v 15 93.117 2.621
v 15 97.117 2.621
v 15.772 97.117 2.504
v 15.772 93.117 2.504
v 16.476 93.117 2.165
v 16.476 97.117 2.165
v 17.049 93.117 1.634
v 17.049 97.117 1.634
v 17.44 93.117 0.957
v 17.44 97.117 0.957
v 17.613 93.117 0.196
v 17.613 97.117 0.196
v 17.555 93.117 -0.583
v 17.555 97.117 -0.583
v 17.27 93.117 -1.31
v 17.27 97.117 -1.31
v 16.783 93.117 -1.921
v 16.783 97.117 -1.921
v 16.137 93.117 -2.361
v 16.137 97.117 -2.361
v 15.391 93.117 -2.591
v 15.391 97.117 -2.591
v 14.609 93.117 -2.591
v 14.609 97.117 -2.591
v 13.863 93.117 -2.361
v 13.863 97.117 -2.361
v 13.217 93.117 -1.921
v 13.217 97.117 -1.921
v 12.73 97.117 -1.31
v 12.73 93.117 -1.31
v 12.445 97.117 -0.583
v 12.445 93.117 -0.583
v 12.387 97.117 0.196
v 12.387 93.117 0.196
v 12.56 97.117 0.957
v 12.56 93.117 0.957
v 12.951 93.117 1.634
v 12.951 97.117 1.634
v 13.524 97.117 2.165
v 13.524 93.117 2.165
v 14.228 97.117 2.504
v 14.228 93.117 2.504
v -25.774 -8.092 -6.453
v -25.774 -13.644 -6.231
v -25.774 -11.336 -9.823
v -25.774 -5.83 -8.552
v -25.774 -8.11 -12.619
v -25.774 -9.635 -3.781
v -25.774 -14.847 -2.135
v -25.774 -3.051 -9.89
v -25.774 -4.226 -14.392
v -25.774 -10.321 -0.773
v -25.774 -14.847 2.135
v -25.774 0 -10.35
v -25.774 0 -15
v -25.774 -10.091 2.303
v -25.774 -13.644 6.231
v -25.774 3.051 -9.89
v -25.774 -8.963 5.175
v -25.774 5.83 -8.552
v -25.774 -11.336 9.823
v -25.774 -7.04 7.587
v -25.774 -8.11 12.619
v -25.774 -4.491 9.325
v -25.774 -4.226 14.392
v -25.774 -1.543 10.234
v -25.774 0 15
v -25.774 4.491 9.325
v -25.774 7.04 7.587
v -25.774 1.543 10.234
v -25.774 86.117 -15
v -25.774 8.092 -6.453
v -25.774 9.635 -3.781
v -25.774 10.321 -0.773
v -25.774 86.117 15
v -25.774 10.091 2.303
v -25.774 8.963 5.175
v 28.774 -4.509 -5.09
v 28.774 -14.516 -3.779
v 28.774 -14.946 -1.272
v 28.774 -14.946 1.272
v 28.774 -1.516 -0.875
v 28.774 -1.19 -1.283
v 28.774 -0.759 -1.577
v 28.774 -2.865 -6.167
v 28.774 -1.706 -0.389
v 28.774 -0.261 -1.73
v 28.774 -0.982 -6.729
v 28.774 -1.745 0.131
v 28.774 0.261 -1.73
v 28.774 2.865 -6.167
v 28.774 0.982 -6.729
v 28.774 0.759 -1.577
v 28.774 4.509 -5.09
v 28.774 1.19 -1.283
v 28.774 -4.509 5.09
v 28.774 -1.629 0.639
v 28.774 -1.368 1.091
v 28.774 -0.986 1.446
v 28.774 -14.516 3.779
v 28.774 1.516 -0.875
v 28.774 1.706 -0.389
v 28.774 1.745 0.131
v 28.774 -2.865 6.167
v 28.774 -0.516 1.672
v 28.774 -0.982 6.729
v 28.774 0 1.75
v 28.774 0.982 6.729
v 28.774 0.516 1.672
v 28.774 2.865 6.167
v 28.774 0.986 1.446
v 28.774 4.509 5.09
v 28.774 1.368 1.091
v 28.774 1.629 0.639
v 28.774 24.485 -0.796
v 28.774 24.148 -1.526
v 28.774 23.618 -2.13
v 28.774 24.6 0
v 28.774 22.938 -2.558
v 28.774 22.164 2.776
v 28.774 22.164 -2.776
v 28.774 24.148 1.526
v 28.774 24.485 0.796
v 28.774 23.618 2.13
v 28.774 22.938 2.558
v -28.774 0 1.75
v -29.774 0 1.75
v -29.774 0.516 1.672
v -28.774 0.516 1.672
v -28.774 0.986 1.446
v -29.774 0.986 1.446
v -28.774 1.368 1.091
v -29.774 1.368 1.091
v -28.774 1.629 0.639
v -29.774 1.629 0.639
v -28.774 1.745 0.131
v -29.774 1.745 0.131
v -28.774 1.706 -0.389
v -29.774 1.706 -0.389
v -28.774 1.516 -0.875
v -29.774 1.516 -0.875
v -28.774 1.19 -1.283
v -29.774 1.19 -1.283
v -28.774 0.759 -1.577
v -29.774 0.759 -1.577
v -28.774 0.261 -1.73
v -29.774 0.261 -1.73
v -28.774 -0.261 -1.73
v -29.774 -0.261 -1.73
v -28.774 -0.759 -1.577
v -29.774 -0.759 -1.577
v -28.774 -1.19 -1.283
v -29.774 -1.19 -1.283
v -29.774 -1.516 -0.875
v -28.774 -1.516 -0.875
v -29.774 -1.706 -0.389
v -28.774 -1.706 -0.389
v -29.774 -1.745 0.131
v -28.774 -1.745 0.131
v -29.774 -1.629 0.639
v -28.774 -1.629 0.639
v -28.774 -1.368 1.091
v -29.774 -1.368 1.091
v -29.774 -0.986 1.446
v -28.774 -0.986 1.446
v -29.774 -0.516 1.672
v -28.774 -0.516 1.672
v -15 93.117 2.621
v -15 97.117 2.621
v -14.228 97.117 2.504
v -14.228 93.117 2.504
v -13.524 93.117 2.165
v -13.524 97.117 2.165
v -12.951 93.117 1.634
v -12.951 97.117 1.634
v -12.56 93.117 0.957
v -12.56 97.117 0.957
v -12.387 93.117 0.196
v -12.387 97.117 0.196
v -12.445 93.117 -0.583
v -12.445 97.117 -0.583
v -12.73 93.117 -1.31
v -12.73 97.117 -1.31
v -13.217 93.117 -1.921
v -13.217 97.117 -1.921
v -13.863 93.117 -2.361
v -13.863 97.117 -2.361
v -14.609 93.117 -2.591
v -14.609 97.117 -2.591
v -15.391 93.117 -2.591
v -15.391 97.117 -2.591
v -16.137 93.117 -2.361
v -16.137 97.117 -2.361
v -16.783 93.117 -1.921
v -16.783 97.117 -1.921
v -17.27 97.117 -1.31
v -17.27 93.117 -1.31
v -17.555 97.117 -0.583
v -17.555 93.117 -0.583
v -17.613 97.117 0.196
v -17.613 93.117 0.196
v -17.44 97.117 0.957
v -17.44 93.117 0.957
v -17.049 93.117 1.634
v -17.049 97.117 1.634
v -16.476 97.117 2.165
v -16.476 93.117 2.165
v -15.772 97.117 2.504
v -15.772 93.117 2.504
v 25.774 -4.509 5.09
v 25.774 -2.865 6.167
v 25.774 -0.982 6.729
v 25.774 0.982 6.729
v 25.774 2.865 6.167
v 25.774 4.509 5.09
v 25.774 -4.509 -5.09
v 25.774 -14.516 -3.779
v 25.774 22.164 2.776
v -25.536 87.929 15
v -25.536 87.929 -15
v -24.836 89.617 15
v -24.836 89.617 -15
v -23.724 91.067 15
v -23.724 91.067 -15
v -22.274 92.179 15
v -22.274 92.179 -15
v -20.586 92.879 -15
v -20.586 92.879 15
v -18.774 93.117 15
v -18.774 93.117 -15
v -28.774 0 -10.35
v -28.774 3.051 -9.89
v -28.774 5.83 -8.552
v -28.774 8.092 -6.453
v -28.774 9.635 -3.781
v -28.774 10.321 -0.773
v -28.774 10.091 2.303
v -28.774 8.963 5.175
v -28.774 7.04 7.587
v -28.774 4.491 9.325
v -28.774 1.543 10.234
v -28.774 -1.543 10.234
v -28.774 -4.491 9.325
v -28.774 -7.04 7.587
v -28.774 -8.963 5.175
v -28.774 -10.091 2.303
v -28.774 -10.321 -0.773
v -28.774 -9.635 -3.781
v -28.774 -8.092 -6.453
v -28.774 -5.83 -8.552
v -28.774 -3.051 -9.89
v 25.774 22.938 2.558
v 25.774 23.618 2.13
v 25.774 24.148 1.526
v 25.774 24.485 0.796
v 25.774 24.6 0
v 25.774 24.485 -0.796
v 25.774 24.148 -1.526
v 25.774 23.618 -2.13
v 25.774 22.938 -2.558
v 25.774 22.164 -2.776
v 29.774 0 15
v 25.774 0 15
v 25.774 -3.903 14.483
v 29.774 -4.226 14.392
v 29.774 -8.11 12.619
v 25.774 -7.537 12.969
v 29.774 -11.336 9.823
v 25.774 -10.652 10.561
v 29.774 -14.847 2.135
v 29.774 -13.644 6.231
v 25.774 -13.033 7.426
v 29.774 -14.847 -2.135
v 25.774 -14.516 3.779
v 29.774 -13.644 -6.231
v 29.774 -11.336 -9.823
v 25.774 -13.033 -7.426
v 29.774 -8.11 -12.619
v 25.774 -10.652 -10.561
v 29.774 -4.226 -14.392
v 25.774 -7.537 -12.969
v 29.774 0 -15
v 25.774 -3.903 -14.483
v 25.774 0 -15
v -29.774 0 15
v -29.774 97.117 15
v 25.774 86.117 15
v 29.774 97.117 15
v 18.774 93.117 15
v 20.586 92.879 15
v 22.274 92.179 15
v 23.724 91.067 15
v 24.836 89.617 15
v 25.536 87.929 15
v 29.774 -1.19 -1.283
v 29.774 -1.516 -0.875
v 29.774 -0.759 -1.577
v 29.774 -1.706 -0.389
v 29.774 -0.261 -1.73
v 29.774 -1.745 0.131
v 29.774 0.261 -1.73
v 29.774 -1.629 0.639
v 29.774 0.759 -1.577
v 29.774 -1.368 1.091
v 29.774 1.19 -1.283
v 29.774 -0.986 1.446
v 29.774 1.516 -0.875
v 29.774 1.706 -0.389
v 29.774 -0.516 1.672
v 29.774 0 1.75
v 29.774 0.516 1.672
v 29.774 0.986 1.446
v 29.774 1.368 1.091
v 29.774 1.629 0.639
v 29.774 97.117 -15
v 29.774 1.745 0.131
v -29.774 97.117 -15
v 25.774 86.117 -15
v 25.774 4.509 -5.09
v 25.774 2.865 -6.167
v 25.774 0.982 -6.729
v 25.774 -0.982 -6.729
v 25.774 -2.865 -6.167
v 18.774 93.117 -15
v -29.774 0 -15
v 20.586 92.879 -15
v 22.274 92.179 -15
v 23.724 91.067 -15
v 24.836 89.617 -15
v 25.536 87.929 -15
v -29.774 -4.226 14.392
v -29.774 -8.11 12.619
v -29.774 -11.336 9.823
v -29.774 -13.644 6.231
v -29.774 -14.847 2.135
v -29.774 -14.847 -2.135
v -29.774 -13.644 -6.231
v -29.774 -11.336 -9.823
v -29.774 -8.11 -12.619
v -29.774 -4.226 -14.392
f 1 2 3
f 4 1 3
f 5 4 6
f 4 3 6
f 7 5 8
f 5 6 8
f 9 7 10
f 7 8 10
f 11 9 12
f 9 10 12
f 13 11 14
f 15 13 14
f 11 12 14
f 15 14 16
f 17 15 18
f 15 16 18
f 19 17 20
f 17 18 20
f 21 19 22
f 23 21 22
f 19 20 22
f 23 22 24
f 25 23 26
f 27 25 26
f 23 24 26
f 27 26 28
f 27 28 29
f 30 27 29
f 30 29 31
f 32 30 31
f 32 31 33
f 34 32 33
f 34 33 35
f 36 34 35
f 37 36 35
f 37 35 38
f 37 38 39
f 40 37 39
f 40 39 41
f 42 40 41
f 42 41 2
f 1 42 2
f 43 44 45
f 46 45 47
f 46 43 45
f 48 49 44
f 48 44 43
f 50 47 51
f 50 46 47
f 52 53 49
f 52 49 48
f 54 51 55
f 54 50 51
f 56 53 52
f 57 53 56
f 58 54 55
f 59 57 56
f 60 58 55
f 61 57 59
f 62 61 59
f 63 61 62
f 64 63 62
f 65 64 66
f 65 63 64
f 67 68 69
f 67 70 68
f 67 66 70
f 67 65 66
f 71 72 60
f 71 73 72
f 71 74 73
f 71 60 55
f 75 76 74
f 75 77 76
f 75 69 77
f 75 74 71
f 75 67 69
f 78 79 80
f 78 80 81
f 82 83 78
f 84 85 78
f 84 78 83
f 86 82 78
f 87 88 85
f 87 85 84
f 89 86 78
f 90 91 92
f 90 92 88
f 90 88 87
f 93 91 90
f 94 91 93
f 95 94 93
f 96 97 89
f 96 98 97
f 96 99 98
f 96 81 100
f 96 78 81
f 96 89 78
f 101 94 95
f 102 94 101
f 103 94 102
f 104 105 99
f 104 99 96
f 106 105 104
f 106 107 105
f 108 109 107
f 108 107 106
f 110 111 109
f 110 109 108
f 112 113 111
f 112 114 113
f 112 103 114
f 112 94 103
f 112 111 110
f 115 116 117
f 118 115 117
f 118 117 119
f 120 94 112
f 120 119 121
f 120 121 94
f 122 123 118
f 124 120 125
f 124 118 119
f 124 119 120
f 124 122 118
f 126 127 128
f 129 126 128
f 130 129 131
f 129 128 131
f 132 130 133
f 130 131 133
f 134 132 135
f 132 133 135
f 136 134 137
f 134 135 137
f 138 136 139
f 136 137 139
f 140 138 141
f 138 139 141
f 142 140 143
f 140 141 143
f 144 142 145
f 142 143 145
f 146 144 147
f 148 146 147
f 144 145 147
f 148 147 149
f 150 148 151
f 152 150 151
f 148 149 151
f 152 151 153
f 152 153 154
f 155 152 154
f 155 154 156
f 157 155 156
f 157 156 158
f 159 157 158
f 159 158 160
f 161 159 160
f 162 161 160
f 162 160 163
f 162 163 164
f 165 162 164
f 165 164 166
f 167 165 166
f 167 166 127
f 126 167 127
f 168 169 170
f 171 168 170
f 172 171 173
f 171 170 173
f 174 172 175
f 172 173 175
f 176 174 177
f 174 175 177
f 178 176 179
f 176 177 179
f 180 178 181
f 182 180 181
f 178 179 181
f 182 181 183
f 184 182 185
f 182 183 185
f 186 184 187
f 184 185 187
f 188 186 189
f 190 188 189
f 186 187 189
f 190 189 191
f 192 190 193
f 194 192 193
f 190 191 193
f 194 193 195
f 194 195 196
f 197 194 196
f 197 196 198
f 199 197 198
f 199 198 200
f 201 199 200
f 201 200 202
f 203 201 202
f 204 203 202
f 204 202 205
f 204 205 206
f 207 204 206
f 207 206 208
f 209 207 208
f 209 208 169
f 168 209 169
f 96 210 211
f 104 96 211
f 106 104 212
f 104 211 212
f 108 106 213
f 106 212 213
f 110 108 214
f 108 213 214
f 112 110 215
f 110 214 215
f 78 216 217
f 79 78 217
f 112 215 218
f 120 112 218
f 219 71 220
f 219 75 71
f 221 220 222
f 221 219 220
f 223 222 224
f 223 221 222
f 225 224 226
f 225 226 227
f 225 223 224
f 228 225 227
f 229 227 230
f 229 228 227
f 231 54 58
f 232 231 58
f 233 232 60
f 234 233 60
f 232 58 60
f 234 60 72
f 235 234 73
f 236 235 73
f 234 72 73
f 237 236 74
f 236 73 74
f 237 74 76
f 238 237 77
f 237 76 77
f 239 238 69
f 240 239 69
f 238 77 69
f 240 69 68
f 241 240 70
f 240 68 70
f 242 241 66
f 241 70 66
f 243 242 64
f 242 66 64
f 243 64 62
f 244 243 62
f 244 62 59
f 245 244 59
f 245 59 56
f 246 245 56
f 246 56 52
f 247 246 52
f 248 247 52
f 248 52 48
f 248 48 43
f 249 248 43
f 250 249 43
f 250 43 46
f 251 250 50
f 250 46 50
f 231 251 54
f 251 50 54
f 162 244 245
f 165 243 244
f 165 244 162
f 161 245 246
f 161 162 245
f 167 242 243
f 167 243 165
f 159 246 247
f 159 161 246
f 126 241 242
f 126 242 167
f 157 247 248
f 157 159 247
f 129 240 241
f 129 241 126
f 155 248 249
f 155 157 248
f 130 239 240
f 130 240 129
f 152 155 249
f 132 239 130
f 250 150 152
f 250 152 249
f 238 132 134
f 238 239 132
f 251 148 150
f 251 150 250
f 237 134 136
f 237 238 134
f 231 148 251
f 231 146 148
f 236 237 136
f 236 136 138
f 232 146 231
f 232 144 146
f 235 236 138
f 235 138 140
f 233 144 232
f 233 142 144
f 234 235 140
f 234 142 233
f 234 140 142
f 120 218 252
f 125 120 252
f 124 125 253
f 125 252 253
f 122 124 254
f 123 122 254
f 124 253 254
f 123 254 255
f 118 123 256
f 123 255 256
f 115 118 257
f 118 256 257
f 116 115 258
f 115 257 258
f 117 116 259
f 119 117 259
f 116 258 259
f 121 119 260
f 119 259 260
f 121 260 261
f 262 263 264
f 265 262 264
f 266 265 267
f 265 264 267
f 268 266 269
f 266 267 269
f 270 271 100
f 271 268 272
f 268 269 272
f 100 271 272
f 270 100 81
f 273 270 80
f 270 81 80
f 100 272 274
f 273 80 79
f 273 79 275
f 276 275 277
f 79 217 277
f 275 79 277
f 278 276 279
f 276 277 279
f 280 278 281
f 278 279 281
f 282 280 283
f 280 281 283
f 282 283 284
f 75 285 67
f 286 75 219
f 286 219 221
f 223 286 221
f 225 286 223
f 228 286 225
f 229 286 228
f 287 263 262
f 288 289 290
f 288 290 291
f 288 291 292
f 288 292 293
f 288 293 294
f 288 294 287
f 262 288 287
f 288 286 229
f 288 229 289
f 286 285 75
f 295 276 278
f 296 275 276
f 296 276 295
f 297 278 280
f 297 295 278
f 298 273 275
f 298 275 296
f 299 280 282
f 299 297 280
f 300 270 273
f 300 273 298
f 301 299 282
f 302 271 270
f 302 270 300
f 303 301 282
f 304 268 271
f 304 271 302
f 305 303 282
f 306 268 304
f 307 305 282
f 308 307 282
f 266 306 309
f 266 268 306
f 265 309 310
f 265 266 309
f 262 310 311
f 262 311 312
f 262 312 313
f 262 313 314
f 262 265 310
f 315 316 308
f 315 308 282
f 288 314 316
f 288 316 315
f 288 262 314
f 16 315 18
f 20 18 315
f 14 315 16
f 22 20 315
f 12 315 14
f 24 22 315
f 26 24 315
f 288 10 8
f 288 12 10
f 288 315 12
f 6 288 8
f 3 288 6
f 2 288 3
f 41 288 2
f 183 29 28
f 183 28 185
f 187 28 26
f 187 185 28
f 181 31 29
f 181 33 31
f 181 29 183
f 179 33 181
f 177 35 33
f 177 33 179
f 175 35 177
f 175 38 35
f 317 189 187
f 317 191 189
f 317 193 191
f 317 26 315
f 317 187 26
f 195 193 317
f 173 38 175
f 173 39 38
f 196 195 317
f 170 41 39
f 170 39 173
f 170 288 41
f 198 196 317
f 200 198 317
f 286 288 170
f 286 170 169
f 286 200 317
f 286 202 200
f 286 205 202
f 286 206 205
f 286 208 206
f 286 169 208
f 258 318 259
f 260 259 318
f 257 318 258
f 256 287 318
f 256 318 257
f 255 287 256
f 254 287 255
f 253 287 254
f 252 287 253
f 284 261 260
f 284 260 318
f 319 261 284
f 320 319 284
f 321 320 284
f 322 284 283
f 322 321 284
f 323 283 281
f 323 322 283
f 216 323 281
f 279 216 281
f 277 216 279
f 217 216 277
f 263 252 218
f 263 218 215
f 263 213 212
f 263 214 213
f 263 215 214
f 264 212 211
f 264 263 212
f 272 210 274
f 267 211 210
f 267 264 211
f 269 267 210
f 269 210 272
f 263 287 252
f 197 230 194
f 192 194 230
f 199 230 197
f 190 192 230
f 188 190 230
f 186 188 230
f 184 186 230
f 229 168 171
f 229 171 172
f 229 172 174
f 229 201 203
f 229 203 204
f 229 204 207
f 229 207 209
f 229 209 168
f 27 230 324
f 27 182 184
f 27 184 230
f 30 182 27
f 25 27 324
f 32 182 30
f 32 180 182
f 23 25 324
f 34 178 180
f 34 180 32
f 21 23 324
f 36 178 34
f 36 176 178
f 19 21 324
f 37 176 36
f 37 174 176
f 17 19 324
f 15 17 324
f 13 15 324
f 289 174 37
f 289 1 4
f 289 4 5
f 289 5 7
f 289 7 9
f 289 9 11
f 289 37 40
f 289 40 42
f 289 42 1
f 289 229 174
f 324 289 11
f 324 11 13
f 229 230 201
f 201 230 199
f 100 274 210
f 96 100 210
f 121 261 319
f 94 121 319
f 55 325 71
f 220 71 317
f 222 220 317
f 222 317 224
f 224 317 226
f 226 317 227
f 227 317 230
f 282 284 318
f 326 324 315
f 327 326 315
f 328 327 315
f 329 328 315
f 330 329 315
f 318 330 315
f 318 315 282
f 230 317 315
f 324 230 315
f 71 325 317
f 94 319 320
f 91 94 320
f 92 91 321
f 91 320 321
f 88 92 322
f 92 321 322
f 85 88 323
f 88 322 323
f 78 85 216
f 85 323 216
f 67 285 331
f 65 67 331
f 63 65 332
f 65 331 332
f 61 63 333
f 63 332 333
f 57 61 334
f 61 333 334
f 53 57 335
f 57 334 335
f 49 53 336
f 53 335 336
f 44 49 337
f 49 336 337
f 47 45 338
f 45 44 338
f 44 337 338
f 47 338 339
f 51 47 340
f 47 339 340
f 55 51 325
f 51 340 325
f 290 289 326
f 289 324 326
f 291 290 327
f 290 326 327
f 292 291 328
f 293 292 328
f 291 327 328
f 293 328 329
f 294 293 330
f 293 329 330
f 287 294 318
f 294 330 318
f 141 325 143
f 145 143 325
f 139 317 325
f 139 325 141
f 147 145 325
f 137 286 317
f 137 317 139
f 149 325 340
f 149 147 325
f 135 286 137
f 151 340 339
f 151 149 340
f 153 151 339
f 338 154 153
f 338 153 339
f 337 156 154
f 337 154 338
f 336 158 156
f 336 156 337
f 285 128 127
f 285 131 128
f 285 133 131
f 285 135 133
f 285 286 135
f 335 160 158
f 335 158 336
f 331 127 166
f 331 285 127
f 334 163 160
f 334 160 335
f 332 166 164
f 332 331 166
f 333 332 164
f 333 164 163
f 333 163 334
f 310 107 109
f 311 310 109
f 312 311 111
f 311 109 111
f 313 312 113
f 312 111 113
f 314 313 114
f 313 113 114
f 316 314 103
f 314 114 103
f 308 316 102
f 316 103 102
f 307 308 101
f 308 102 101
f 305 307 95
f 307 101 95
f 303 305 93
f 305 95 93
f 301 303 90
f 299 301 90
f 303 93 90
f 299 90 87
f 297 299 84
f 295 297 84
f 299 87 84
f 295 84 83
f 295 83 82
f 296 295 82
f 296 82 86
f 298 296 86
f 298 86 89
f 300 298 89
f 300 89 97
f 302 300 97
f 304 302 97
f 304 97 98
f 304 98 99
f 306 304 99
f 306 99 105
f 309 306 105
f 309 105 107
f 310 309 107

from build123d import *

# Parameters (mm, degrees)
EXTRUDE_2_DEPTH     = 15
SKETCH_2_R          = 2.62067407
CUT_EXTRUDE_1_DEPTH = 30
CUT_EXTRUDE_2_DEPTH = 3
SKETCH_5_R          = 10.35
CUT_EXTRUDE_3_DEPTH = 3
SKETCH_6_R          = 1.75
CUT_EXTRUDE_4_DEPTH = 73
FILLET_1_R          = 7
FILLET_2_R          = 15
CUT_EXTRUDE_5_DEPTH = 80


with BuildPart() as part:
    # 草图1 → 拉伸-薄壁2 (new, symmetric)
    with BuildSketch(Plane.XY):
        Polygon((29.774038515, -24.3), (29.774038515, 97.117302362), (0, 97.117302362), (-29.774038515, 97.117302362), (-29.774038515, -24.3), (-25.774038515, -24.3), (-25.774038515, 93.117302362), (0, 93.117302362), (25.774038515, 93.117302362), (25.774038515, -24.3), align=None)
    extrude(amount=EXTRUDE_2_DEPTH, both=True)

    # 草图2 → 切除-拉伸1 (cut)
    with BuildSketch(Plane(origin=(0, 97.117302362, 0), x_dir=(1, 0, 0), z_dir=(0, 1, 0))):
        with Locations(Location((-15, 0, 0), (0, 0, 270))):
            Circle(SKETCH_2_R)
        with Locations(Location((15, 0, 0), (0, 0, 270))):
            Circle(SKETCH_2_R)
    extrude(amount=-CUT_EXTRUDE_1_DEPTH, mode=Mode.SUBTRACT)

    # 草图4 → 切除-拉伸2 (cut)
    with BuildSketch(Plane.ZY.offset(-25.774038515)):
        with BuildLine():
            Line((-2.776256892, 22.163864907), (-5.090172263, 4.508896355))
            ThreePointArc((-5.090172263, 4.508896355), (-6.8, 0), (-5.090172263, -4.508896355))
            Line((-5.090172263, -4.508896355), (-2.776256892, -22.163864907))
            ThreePointArc((-2.776256892, -22.163864907), (0, -24.6), (2.776256892, -22.163864907))
            Line((2.776256892, -22.163864907), (5.090172263, -4.508896355))
            ThreePointArc((5.090172263, -4.508896355), (6.8, 0), (5.090172263, 4.508896355))
            Line((5.090172263, 4.508896355), (2.776256892, 22.163864907))
            ThreePointArc((2.776256892, 22.163864907), (0, 24.6), (-2.776256892, 22.163864907))
        make_face()
    extrude(amount=-CUT_EXTRUDE_2_DEPTH, mode=Mode.SUBTRACT)

    # 草图5 → 切除-拉伸3 (cut)
    with BuildSketch(Plane(origin=(-25.774038515, 0, 0), x_dir=(0, 0, -1), z_dir=(1, 0, 0))):
        Circle(SKETCH_5_R)
    extrude(amount=-CUT_EXTRUDE_3_DEPTH, mode=Mode.SUBTRACT)

    # 草图6 → 切除-拉伸4 (cut)
    with BuildSketch(Plane.ZY.offset(29.774038515)):
        Circle(SKETCH_6_R)
    extrude(amount=-CUT_EXTRUDE_4_DEPTH, mode=Mode.SUBTRACT)

    # 圆角1
    fillet_1_edges = [part.edges().sort_by_distance(p)[0] for p in [
        (25.774038515, 93.117302362, 0),
        (-25.774038515, 93.117302362, 0),
    ]]
    fillet(fillet_1_edges, radius=FILLET_1_R)

    # 圆角2
    fillet_2_edges = [part.edges().sort_by_distance(p)[0] for p in [
        (27.774038515, -24.3, -15),
        (-27.774038515, -24.3, -15),
        (-27.774038515, -24.3, 15),
        (27.774038515, -24.3, 15),
    ]]
    fillet(fillet_2_edges, radius=FILLET_2_R - 0.0001)  # a hair under: the kernel refuses the full size

    # 草图7 → 切除-拉伸5 (cut)
    with BuildSketch(Plane.ZY.offset(29.774038515)):
        with BuildLine():
            ThreePointArc((15, 0), (0, -15), (-15, 0))
            Line((-15, 0), (-15, -9.3))
            ThreePointArc((-15, -9.3), (-10.606601718, -19.906601718), (0, -24.3))
            ThreePointArc((0, -24.3), (10.606601718, -19.906601718), (15, -9.3))
            Line((15, -9.3), (15, 0))
        make_face()
    extrude(amount=-CUT_EXTRUDE_5_DEPTH, mode=Mode.SUBTRACT)


with BuildPart() as cut_extrude_5_kept_piece:
    # of the separate pieces the step leaves, the one the design keeps (cut_extrude_5_pieces_kept)
    add(part.part.solids().sort_by_distance((-29.774038515, 0, -15))[0])


solid = cut_extrude_5_kept_piece.part
